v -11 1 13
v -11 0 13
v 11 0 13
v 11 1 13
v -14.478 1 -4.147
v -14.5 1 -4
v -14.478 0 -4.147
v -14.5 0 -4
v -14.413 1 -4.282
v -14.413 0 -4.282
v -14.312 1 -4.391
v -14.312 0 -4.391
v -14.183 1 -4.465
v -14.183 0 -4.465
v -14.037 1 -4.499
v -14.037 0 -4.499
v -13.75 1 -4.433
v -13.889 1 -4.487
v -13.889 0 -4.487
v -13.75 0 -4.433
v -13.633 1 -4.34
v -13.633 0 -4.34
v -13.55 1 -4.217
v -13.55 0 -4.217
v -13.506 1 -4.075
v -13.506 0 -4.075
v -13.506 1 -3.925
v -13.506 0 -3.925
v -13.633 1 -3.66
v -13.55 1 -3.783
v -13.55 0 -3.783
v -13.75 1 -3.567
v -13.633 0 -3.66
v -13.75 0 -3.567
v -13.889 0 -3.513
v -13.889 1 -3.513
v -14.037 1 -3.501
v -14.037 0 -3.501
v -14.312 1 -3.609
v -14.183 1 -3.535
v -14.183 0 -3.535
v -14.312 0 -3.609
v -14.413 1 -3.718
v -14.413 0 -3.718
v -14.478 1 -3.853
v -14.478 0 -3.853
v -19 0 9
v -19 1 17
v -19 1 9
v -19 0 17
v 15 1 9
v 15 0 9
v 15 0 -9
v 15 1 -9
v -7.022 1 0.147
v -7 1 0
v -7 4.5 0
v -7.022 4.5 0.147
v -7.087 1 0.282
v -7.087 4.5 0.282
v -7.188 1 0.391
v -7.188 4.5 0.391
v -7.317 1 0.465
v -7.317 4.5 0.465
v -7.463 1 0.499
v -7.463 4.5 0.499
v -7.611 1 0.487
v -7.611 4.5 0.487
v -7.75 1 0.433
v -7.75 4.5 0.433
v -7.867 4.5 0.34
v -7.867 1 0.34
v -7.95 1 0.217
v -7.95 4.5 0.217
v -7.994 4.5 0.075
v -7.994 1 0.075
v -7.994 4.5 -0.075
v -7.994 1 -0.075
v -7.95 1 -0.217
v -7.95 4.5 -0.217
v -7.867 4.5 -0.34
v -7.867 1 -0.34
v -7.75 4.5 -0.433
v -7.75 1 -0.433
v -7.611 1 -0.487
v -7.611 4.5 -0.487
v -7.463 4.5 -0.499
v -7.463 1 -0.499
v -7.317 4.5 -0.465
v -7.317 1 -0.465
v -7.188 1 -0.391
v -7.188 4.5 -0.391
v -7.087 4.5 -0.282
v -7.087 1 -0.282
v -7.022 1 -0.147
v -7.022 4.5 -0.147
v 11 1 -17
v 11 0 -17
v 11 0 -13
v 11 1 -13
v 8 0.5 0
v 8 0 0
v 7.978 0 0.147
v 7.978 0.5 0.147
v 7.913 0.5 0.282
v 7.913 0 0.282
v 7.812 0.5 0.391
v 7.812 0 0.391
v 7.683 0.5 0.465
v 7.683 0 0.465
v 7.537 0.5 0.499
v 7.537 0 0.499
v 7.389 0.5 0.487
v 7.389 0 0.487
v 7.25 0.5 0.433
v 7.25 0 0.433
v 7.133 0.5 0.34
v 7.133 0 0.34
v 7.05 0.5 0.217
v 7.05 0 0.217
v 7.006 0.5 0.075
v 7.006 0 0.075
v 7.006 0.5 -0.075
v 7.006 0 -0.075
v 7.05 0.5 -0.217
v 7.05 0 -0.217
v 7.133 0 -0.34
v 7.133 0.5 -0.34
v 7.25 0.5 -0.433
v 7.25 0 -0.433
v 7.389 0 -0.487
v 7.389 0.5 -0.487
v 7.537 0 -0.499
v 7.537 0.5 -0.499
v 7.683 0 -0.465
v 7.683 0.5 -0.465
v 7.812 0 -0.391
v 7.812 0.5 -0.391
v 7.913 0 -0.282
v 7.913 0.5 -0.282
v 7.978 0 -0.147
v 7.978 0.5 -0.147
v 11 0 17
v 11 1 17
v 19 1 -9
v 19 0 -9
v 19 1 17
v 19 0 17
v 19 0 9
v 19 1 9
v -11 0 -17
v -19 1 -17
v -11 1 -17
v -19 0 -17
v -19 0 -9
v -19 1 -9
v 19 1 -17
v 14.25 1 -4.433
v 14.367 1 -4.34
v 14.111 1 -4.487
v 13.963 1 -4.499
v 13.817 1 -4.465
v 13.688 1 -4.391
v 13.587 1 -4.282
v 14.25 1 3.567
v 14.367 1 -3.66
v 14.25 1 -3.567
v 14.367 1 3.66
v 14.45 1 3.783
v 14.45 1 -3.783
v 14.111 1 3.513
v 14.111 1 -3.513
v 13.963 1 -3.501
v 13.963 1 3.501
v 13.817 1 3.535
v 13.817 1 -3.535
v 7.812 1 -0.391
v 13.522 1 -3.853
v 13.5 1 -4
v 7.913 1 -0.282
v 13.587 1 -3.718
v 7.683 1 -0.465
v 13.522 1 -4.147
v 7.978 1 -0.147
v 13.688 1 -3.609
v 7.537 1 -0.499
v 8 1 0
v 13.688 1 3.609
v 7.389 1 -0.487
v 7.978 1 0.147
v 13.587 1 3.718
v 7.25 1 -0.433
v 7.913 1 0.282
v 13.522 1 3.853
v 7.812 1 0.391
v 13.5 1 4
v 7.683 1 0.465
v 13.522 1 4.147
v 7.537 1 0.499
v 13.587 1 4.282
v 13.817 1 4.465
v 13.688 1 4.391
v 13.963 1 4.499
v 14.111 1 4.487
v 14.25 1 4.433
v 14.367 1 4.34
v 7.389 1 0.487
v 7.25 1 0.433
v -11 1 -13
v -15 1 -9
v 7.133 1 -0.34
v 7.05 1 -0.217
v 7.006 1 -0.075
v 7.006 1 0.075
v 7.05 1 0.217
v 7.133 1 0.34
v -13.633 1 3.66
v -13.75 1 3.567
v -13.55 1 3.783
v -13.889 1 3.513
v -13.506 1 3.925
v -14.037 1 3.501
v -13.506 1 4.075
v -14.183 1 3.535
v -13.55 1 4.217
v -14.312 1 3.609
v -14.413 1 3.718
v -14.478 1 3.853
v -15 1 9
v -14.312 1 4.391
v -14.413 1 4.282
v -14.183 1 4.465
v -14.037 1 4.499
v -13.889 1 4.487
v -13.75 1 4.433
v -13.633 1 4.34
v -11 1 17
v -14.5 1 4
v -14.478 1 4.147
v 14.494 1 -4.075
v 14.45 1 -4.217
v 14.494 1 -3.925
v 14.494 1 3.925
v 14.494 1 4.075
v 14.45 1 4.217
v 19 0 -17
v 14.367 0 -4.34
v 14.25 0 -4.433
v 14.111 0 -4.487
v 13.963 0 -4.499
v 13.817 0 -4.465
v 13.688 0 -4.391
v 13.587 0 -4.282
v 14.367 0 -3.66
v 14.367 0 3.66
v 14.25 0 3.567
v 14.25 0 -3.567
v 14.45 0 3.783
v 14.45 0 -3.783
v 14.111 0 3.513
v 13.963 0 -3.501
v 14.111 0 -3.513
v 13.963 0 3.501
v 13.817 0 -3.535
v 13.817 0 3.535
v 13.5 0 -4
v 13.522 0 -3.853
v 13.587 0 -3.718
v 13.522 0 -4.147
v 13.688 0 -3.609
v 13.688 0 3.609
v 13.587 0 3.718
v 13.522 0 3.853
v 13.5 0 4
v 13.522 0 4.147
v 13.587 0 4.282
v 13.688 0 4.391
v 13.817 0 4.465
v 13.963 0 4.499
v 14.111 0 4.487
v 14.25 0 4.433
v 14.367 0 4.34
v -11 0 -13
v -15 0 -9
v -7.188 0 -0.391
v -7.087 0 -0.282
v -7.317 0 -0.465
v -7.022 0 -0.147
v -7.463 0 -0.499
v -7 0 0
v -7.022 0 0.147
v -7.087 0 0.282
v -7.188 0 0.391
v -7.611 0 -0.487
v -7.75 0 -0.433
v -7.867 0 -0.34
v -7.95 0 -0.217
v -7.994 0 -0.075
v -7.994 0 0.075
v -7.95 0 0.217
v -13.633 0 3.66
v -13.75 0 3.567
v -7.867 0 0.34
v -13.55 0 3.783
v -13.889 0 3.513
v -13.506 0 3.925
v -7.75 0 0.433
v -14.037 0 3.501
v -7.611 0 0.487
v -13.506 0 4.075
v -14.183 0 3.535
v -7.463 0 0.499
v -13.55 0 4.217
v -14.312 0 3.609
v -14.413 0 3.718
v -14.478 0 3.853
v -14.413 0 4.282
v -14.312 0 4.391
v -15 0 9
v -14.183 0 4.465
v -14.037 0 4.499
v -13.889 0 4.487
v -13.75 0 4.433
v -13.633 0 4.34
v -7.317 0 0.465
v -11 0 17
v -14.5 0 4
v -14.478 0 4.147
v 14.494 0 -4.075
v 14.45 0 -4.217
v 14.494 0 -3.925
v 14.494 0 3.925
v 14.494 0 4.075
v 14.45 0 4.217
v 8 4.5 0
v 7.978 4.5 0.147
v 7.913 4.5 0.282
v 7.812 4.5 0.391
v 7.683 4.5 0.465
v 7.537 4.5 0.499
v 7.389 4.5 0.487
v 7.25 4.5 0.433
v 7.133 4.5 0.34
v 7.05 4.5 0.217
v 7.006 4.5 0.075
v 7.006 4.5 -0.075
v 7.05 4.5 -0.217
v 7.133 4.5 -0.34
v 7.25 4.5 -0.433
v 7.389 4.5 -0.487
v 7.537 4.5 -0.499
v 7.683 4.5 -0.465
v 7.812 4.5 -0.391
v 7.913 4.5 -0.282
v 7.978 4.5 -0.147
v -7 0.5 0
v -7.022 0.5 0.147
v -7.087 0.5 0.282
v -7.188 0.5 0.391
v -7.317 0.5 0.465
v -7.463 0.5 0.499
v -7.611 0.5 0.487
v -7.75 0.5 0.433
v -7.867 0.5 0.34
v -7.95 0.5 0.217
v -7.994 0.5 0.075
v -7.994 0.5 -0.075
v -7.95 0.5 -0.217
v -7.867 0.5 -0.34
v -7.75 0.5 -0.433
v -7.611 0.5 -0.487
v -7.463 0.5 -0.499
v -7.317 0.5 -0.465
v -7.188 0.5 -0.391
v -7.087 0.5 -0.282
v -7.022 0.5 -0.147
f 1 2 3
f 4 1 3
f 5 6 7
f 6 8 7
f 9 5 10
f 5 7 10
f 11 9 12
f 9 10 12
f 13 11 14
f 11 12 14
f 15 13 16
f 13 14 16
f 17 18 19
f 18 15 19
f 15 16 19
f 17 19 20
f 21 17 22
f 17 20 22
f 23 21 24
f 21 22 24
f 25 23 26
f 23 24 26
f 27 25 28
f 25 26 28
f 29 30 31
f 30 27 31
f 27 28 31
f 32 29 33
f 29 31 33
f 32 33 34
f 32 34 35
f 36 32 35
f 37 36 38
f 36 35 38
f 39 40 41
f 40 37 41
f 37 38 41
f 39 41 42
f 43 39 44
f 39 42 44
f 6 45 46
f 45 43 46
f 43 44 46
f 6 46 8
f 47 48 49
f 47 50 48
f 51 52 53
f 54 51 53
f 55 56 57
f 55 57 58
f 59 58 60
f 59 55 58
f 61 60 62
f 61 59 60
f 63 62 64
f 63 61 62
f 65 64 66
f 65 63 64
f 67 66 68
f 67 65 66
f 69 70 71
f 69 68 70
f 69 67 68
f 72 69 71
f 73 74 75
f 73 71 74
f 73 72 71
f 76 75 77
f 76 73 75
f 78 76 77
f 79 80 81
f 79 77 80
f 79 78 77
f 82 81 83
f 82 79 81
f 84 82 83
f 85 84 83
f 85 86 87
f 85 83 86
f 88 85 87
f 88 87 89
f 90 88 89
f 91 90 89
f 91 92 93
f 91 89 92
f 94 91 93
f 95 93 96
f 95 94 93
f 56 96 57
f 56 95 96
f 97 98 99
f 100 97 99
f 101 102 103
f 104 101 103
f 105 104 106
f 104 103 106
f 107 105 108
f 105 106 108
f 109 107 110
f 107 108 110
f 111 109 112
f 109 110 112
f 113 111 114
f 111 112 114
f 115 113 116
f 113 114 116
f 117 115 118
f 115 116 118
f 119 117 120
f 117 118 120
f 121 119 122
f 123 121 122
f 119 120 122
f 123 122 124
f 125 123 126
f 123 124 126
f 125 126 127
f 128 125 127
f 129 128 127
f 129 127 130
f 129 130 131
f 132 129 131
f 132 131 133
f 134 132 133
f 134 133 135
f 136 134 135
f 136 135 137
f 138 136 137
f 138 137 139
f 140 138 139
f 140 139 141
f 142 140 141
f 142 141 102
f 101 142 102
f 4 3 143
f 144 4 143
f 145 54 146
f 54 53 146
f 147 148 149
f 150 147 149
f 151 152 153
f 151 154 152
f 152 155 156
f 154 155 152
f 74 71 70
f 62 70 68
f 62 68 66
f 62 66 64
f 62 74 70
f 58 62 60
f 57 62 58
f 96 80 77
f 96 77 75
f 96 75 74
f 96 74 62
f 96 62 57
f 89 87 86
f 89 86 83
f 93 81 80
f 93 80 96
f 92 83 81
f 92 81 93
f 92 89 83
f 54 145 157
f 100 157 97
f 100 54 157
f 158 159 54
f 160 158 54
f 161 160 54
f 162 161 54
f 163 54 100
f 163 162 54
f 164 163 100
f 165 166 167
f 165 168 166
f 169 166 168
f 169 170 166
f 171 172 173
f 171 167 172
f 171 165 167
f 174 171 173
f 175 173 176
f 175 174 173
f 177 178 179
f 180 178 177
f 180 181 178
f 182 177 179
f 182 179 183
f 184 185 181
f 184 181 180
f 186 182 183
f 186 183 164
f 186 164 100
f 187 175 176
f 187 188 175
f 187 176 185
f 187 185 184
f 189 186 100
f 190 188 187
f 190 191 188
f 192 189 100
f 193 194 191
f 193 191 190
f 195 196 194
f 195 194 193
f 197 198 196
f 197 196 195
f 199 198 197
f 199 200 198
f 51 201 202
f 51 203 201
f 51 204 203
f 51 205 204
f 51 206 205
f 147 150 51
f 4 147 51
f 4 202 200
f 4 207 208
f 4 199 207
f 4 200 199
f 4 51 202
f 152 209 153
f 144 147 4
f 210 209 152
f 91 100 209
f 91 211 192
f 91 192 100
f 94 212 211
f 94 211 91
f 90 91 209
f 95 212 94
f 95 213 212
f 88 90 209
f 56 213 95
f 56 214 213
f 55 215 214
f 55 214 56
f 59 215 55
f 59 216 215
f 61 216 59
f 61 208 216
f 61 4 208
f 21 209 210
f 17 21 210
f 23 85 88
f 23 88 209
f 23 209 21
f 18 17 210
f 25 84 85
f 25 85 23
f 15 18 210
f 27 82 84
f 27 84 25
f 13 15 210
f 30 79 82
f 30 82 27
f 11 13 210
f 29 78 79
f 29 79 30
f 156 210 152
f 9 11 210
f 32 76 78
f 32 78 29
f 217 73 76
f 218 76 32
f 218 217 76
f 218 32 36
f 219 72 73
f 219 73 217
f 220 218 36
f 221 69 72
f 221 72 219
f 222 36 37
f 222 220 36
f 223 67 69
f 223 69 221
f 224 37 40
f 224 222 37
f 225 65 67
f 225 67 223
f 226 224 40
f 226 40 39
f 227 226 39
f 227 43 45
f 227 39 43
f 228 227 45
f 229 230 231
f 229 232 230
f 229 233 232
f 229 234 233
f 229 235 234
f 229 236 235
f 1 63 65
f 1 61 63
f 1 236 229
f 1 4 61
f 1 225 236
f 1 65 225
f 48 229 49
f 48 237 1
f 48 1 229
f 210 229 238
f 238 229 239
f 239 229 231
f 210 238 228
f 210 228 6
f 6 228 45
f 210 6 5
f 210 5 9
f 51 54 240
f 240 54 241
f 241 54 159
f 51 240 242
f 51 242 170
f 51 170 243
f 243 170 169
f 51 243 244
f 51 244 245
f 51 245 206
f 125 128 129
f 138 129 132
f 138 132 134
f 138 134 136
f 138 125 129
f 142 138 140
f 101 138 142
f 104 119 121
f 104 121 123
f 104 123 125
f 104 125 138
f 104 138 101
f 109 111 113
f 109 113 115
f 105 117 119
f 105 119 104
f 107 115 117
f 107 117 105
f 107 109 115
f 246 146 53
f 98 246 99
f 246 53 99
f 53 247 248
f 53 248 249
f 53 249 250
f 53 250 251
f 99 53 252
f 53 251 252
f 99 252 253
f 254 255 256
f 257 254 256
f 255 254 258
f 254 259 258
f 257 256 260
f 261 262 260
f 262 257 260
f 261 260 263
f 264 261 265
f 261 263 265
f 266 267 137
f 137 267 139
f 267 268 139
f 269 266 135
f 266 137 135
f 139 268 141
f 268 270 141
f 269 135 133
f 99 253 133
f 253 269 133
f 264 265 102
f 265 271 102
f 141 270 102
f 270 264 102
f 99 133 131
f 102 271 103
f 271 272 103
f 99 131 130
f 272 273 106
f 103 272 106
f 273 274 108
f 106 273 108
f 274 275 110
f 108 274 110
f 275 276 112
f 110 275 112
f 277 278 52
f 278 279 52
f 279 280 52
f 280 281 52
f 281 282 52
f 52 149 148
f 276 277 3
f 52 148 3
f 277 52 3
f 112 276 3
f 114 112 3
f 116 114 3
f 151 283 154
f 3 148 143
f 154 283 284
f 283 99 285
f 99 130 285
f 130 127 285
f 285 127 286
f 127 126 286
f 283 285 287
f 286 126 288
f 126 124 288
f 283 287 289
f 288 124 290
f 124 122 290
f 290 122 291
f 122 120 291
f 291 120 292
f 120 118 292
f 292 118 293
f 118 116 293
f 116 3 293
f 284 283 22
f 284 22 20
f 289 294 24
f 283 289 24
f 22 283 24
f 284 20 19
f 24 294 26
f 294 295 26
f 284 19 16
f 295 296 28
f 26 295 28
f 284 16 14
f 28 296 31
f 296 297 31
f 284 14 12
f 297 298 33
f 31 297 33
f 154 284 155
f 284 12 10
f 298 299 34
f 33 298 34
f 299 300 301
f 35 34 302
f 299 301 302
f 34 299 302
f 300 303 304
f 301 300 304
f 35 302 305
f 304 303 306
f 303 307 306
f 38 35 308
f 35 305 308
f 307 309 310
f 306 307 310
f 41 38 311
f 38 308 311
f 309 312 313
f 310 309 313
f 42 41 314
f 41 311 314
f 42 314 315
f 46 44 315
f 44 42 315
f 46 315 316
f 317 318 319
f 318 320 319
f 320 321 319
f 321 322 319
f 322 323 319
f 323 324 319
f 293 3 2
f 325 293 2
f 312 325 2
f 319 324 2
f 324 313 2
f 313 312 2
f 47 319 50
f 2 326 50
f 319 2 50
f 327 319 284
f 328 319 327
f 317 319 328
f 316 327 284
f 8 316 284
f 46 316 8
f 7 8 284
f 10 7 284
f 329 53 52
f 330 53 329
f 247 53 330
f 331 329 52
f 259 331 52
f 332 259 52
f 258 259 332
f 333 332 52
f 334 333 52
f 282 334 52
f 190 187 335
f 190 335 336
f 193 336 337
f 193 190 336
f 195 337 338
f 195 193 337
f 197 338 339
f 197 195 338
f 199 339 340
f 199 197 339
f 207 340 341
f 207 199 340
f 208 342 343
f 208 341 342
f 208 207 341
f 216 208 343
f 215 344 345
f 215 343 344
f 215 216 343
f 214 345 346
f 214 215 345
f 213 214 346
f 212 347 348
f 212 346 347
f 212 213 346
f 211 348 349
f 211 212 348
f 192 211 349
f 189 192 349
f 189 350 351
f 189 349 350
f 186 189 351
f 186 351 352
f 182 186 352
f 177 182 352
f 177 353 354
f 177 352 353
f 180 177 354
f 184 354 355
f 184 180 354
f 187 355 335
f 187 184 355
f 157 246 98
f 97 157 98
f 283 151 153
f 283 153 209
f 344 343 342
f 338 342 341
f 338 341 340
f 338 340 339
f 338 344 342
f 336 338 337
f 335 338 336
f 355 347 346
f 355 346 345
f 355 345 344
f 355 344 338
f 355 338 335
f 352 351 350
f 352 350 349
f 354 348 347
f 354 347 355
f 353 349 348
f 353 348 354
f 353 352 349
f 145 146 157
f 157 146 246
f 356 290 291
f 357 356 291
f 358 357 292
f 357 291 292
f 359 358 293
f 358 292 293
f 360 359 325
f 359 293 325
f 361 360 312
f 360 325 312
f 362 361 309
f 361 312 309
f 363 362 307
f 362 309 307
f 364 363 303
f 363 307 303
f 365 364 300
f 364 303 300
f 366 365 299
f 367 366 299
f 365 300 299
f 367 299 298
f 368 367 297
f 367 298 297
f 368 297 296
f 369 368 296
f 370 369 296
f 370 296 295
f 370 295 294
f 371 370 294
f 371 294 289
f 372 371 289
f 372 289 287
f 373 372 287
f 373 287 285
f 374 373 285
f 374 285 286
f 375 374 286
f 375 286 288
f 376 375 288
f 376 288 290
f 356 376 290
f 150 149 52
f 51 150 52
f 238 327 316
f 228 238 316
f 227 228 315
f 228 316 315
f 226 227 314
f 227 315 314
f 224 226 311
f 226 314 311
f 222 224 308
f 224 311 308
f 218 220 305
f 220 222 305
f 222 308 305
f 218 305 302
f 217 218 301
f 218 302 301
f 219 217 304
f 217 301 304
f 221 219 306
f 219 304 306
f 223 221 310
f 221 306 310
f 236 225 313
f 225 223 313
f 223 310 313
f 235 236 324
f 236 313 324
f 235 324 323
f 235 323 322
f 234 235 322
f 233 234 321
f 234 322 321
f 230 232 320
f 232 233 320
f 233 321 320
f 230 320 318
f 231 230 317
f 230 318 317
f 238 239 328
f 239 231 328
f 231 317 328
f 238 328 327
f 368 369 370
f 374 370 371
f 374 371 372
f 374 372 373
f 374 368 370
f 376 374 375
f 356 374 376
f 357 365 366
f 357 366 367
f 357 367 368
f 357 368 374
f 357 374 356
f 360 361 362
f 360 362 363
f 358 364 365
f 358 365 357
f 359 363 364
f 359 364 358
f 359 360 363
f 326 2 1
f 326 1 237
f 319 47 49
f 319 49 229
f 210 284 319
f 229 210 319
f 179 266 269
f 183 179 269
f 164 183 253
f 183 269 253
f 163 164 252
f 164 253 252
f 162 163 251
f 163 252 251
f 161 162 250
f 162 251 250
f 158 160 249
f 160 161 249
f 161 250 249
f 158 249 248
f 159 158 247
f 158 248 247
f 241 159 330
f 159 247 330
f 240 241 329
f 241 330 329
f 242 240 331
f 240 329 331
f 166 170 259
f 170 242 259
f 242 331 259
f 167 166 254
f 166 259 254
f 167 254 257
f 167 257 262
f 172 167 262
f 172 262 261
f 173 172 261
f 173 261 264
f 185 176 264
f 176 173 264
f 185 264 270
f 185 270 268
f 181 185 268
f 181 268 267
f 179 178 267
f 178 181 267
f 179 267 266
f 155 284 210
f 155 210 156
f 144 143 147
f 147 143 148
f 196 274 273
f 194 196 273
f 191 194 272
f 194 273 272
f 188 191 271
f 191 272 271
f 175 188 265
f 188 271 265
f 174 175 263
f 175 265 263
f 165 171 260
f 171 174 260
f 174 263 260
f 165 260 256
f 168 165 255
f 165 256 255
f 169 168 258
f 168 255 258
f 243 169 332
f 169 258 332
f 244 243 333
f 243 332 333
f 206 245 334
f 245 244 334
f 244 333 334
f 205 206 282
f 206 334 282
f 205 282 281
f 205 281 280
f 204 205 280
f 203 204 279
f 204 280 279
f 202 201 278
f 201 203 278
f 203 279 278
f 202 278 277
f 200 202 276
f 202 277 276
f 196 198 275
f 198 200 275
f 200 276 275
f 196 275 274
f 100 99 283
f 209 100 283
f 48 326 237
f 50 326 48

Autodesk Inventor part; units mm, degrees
ref_plane "YZ Plane" through (0, 0, 0) normal (1, 0, 0) x (0, 1, 0)
ref_plane "XZ Plane" through (0, 0, 0) normal (0, 1, 0) x (-1, 0, 0)
ref_plane "XY Plane" through (0, 0, 0) normal (0, 0, 1) x (1, 0, 0)
sketch "Sketch1" plane through (0, 0, 0) normal (0, 1, 0) x (-1, 0, 0)
  line L0 (15, 13) -> (-15, 13)
  line L1 (-15, 13) -> (-15, -13)
  line L2 (-15, -13) -> (15, -13)
  line L3 (15, -13) -> (15, 13)
  line L4 (15, 13) -> (-15, -13) construction
  line L5 (-15, 13) -> (15, -13) construction
  circle A0 centre (-14, 4) radius 0.5
  circle A1 centre (14, 4) radius 0.5
  circle A2 centre (14, -4) radius 0.5
  circle A3 centre (-14, -4) radius 0.5
  line L6 (-11, 17) -> (-19, 17)
  line L7 (-19, 17) -> (-19, 9)
  line L8 (-19, 9) -> (-11, 9)
  line L9 (-11, 9) -> (-11, 17)
  line L10 (-11, 17) -> (-19, 9) construction
  line L11 (-19, 17) -> (-11, 9) construction
  line L12 (19, 9) -> (11, 9)
  line L13 (11, 9) -> (11, 17)
  line L14 (11, 17) -> (19, 17)
  line L15 (19, 17) -> (19, 9)
  line L16 (19, 9) -> (11, 17) construction
  line L17 (11, 9) -> (19, 17) construction
  line L18 (19, -17) -> (11, -17)
  line L19 (11, -17) -> (11, -9)
  line L20 (11, -9) -> (19, -9)
  line L21 (19, -9) -> (19, -17)
  line L22 (19, -17) -> (11, -9) construction
  line L23 (11, -17) -> (19, -9) construction
  line L24 (-11, -9) -> (-19, -9)
  line L25 (-19, -9) -> (-19, -17)
  line L26 (-19, -17) -> (-11, -17)
  line L27 (-11, -17) -> (-11, -9)
  line L28 (-11, -9) -> (-19, -17) construction
  line L29 (-19, -9) -> (-11, -17) construction
  point P0 (0, 0)
  point P1 (11, 13)
  point P2 (15, 9)
  point P3 (15, -9)
  point P4 (11, -13)
  point P5 (-11, -13)
  point P6 (-15, -9)
  point P7 (-15, 9)
  point P8 (-11, 13)
  dimension "d0" = 30
  dimension "d1" = 26
  dimension "d4" = 1
  dimension "d5" = 9
  dimension "d6" = 1
  dimension "d7" = 1
  dimension "d8" = 1
  dimension "d9" = 1
  dimension "d10" = 1
  dimension "d11" = 9
  dimension "d12" = 1
  dimension "d13" = 9
  dimension "d14" = 9
  dimension "d15" = 1
  dimension "d24" = 8
  dimension "d25" = 8
  dimension "d26" = 8
  dimension "d27" = 8
  dimension "d28" = 8
  dimension "d29" = 8
  dimension "d30" = 8
  dimension "d31" = 8
extrude "Extrusion1" add sketch "Sketch1" along normal blind 1
sketch "Sketch3" plane through (0, 1, 0) normal (0, 1, 0) x (1, 0, 0)
  line L0 (15, -9) -> (15, 9) projected
  line L1 (15, 9) -> (19, 9) projected
  line L2 (19, 9) -> (19, 17) projected
  line L3 (19, 17) -> (11, 17) projected
  line L4 (11, 17) -> (11, 13) projected
  line L5 (11, 13) -> (-11, 13) projected
  line L6 (-11, 13) -> (-11, 17) projected
  line L7 (-11, 17) -> (-19, 17) projected
  line L8 (-19, 17) -> (-19, 9) projected
  line L9 (-19, 9) -> (-15, 9) projected
  line L10 (-15, 9) -> (-15, -9) projected
  line L11 (-15, -9) -> (-19, -9) projected
  line L12 (-19, -9) -> (-19, -17) projected
  line L13 (-19, -17) -> (-11, -17) projected
  line L14 (-11, -17) -> (-11, -13) projected
  line L15 (-11, -13) -> (11, -13) projected
  line L16 (11, -13) -> (11, -17) projected
  line L17 (11, -17) -> (19, -17) projected
  line L18 (19, -17) -> (19, -9) projected
  line L19 (19, -9) -> (15, -9) projected
  circle A0 centre (14, -4) radius 0.5 projected
  circle A1 centre (-14, -4) radius 0.5 projected
  circle A2 centre (-14, 4) radius 0.5 projected
  circle A3 centre (14, 4) radius 0.5 projected
  circle A4 centre (-7.5, 0) radius 0.5
  circle A5 centre (7.5, 0) radius 0.5
  point P0 (0, 0)
  dimension "d32" = 1
  dimension "d33" = 1
  dimension "d34" = 7.5
  dimension "d35" = 7.5
extrude "Extrusion2" add sketch "Sketch3" along normal blind 3.5 contours A4 | A5
sketch "Sketch4" plane through (0, 0, 0) normal (0, -1, 0) x (1, 0, 0)
  line L0 (15, 9) -> (15, -9) projected
  line L1 (19, 9) -> (15, 9) projected
  line L2 (19, 17) -> (19, 9) projected
  line L3 (11, 17) -> (19, 17) projected
  line L4 (11, 13) -> (11, 17) projected
  line L5 (-11, 13) -> (11, 13) projected
  line L6 (-11, 17) -> (-11, 13) projected
  line L7 (-19, 17) -> (-11, 17) projected
  line L8 (-19, 9) -> (-19, 17) projected
  line L9 (-15, 9) -> (-19, 9) projected
  line L10 (-15, -9) -> (-15, 9) projected
  line L11 (-19, -9) -> (-15, -9) projected
  line L12 (-19, -17) -> (-19, -9) projected
  line L13 (-11, -17) -> (-19, -17) projected
  line L14 (-11, -13) -> (-11, -17) projected
  line L15 (11, -13) -> (-11, -13) projected
  line L16 (11, -17) -> (11, -13) projected
  line L17 (19, -17) -> (11, -17) projected
  line L18 (19, -9) -> (19, -17) projected
  line L19 (15, -9) -> (19, -9) projected
  circle A0 centre (14, 4) radius 0.5 projected
  circle A1 centre (-14, 4) radius 0.5 projected
  circle A2 centre (-14, -4) radius 0.5 projected
  circle A3 centre (14, -4) radius 0.5 projected
  circle A4 centre (-7.5, 0) radius 0.5 projected
  circle A5 centre (7.5, 0) radius 0.5 projected
  point P0 (0, 0)
extrude "Extrusion3" cut sketch "Sketch4" against normal blind 0.5 contours A4 | A5
equation "\"d24\" = d25"
equation "\"d26\" = d25"
equation "\"d27\" = d25"
equation "\"d28\" = d25"
equation "\"d29\" = d25"
equation "\"d30\" = d25"
equation "\"d31\" = d25"
properties part number "base"
